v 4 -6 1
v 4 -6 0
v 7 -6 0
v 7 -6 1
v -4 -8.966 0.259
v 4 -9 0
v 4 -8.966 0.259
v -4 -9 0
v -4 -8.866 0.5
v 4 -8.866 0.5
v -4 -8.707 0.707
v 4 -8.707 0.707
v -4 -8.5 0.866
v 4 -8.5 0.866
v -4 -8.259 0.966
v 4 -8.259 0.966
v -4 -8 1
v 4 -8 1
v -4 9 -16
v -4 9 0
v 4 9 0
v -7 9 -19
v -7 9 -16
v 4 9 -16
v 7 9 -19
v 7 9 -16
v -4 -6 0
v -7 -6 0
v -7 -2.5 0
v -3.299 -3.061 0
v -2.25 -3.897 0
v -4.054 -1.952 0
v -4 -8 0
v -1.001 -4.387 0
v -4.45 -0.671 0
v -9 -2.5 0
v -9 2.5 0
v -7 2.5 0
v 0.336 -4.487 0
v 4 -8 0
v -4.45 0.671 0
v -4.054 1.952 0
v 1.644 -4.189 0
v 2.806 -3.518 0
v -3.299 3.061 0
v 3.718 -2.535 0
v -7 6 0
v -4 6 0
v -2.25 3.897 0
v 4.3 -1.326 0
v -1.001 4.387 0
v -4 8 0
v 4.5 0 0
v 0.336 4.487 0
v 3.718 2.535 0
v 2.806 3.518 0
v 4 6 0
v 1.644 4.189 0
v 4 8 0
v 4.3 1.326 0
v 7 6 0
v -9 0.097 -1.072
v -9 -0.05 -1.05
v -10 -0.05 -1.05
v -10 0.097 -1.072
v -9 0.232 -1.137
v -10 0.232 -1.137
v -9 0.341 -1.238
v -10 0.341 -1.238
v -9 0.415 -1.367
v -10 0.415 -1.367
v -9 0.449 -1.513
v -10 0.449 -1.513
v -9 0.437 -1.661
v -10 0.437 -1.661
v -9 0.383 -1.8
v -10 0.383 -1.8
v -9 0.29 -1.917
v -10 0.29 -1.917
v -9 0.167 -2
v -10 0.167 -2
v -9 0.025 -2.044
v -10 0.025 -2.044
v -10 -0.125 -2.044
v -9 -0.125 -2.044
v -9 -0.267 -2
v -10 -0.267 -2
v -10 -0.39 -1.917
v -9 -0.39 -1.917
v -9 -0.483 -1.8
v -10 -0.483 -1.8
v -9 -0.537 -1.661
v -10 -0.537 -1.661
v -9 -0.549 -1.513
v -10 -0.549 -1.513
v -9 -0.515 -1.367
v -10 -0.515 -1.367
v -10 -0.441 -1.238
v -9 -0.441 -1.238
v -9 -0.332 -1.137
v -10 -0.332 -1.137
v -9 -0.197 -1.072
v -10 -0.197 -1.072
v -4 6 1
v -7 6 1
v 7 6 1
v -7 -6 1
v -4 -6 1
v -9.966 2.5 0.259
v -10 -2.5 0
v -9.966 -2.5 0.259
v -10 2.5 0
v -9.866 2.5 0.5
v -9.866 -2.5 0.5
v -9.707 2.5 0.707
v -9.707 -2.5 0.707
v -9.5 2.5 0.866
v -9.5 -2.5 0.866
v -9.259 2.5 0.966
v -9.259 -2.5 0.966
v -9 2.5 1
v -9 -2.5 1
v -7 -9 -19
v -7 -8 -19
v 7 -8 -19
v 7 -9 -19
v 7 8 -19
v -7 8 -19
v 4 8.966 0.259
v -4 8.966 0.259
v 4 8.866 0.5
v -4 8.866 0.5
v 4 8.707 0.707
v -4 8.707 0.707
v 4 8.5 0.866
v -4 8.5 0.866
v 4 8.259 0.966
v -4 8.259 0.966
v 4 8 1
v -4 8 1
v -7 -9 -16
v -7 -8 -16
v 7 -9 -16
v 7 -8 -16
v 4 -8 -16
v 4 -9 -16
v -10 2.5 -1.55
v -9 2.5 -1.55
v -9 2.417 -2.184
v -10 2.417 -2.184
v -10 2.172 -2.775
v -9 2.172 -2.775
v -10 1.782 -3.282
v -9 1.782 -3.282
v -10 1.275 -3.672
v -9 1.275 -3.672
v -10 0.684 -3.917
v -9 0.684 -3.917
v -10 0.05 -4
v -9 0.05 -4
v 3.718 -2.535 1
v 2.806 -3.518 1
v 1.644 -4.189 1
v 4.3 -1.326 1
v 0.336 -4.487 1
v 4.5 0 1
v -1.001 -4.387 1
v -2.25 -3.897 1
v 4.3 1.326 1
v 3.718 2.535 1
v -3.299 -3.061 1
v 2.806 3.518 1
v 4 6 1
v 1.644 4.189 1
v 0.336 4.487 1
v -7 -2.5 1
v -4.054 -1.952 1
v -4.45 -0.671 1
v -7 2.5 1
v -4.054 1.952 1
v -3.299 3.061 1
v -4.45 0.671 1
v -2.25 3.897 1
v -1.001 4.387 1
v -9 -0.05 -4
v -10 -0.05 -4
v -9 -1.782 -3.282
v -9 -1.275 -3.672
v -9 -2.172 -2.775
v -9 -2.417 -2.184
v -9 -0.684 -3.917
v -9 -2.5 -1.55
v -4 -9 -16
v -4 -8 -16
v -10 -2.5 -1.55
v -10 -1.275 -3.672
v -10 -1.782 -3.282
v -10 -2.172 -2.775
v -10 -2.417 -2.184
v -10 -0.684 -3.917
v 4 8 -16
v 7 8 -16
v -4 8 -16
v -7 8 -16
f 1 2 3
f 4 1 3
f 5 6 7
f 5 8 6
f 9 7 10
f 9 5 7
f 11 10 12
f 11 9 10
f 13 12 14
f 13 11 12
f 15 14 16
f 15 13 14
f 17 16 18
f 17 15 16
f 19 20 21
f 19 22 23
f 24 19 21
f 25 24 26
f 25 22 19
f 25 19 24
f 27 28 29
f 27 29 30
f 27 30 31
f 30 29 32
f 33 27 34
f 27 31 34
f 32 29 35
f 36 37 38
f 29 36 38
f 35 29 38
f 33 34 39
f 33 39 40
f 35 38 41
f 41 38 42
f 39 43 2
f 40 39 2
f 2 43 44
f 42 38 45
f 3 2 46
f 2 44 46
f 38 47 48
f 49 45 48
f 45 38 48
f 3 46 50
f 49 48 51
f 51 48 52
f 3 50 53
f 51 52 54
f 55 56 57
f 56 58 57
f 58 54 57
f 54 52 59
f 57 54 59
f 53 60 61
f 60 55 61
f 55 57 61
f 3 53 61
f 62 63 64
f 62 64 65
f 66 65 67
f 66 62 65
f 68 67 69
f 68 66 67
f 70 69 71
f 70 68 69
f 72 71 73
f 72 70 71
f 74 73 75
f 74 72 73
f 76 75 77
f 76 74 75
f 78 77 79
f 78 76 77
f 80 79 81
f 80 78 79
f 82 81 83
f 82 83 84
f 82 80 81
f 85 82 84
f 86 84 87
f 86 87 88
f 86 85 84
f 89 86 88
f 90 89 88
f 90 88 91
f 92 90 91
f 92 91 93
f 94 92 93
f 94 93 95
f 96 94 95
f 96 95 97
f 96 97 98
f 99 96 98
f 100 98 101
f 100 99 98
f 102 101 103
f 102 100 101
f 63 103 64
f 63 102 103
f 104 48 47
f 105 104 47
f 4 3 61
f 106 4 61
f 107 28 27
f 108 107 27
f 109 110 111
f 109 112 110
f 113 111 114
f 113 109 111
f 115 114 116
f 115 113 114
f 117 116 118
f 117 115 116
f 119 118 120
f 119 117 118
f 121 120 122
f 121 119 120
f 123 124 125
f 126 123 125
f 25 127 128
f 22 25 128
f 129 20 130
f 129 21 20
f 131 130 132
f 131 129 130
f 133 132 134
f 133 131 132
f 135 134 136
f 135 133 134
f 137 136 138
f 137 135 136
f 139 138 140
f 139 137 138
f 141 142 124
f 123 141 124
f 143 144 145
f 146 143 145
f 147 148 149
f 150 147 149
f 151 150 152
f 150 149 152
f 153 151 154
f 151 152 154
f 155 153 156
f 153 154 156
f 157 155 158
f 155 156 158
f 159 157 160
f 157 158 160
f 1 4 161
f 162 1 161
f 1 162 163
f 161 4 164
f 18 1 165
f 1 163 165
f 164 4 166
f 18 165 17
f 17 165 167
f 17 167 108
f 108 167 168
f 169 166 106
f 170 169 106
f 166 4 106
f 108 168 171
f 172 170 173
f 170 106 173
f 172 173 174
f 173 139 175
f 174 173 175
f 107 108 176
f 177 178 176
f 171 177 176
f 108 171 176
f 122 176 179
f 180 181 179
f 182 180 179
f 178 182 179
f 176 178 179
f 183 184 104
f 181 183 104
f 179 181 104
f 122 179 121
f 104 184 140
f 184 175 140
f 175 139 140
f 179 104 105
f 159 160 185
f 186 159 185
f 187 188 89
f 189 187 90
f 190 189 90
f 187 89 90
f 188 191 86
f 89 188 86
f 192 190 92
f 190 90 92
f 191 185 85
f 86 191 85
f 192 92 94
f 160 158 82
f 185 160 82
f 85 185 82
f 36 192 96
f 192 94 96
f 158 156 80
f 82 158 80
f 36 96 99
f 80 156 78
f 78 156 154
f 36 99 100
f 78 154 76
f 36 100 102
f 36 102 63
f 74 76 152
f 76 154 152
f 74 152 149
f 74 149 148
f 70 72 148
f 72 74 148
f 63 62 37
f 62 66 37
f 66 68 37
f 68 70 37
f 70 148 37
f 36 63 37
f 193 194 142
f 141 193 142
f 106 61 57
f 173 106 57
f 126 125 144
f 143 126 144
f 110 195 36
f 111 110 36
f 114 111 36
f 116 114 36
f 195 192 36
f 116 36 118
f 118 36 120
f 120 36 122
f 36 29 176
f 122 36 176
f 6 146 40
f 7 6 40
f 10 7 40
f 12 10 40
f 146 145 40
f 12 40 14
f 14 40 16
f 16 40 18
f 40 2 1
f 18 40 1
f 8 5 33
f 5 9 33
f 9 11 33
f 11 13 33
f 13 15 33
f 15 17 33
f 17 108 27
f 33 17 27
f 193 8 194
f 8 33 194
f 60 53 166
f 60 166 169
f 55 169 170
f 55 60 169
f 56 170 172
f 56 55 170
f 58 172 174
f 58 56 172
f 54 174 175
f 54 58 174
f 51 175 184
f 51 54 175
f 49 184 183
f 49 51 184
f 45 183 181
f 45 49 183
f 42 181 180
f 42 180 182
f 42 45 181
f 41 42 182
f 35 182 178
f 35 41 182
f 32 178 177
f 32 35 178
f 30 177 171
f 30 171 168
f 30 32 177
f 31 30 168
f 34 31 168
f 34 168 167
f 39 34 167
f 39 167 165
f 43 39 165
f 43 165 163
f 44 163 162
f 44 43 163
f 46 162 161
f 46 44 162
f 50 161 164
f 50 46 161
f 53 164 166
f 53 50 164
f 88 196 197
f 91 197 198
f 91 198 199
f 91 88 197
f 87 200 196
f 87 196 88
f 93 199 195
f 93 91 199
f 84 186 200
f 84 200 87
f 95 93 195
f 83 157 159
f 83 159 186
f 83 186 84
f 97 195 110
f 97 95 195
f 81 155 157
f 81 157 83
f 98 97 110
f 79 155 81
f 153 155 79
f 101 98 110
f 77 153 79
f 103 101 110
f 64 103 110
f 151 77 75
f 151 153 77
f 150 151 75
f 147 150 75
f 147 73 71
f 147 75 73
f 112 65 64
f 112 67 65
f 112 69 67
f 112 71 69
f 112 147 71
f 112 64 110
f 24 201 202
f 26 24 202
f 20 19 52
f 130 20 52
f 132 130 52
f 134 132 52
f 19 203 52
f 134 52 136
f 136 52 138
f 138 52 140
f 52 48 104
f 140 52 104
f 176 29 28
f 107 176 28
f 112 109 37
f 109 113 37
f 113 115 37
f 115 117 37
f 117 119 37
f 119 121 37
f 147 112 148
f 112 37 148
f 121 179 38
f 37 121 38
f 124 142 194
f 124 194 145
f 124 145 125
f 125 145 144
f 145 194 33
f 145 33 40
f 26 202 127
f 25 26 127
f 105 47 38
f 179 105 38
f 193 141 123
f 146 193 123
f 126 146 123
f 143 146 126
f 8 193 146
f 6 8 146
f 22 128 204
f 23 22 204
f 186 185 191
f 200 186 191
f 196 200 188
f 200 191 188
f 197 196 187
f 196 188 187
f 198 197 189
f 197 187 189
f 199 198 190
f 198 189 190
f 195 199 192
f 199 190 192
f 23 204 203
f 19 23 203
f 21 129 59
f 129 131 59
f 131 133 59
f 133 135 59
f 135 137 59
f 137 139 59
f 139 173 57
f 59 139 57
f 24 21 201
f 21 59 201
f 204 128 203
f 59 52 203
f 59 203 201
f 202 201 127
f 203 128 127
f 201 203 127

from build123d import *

# Parameters (mm, degrees)
SKETCH1_R           = 4.5
BOSS_EXTRUDE1_DEPTH = 1
SKETCH2_R           = 0.5
BOSS_EXTRUDE2_DEPTH = 1
BOSS_EXTRUDE3_DEPTH = 1
BOSS_EXTRUDE4_DEPTH = 1
FILLET1_R           = 1


with BuildPart() as part:
    # Sketch1 → Boss-Extrude1 (new body)
    with BuildSketch(Plane.XY):
        Polygon((4, 6), (4, 8), (-4, 8), (-4, 6), (-7, 6), (-7, 2.5), (-9, 2.5), (-9, -2.5), (-7, -2.5), (-7, -6), (-4, -6), (-4, -8), (4, -8), (4, -6), (7, -6), (7, 6), align=None)
        Circle(SKETCH1_R, mode=Mode.SUBTRACT)
    extrude(amount=BOSS_EXTRUDE1_DEPTH)

    # Sketch2 → Boss-Extrude2 (add)
    with BuildSketch(Plane.ZY.offset(9)):
        with BuildLine():
            Line((1, 2.5), (-1.55, 2.5))
            ThreePointArc((-1.55, 2.5), (-3.282411614, 1.782411614), (-4, 0.05))
            Line((-4, 0.05), (-4, -0.05))
            ThreePointArc((-4, -0.05), (-3.282411614, -1.782411614), (-1.55, -2.5))
            Line((-1.55, -2.5), (1, -2.5))
            Line((1, -2.5), (1, 2.5))
        make_face()
        with Locations((-1.55, -0.05)):
            Circle(SKETCH2_R, mode=Mode.SUBTRACT)
    extrude(amount=BOSS_EXTRUDE2_DEPTH)

    # Sketch3 → Boss-Extrude3 (add)
    with BuildSketch(Plane(origin=(0, 8, 0), x_dir=(1, 0, 0), z_dir=(0, 1, 0))):
        Polygon((4, 0), (4, 16), (7, 16), (7, 19), (-7, 19), (-7, 16), (-4, 16), (-4, 0), (-4, -1), (4, -1), align=None)
    extrude(amount=BOSS_EXTRUDE3_DEPTH)

    # Sketch4 → Boss-Extrude4 (add)
    with BuildSketch(Plane.XZ.offset(8)):
        Polygon((-4, 1), (-4, -16), (-7, -16), (-7, -19), (7, -19), (7, -16), (4, -16), (4, 1), align=None)
    extrude(amount=BOSS_EXTRUDE4_DEPTH)

    # Fillet1
    fillet1_edges = [part.edges().sort_by_distance(p)[0] for p in [
        (-10, 0, 1),
        (0, 9, 1),
        (0, -9, 1),
    ]]
    fillet(fillet1_edges, radius=FILLET1_R)


solid = part.part
